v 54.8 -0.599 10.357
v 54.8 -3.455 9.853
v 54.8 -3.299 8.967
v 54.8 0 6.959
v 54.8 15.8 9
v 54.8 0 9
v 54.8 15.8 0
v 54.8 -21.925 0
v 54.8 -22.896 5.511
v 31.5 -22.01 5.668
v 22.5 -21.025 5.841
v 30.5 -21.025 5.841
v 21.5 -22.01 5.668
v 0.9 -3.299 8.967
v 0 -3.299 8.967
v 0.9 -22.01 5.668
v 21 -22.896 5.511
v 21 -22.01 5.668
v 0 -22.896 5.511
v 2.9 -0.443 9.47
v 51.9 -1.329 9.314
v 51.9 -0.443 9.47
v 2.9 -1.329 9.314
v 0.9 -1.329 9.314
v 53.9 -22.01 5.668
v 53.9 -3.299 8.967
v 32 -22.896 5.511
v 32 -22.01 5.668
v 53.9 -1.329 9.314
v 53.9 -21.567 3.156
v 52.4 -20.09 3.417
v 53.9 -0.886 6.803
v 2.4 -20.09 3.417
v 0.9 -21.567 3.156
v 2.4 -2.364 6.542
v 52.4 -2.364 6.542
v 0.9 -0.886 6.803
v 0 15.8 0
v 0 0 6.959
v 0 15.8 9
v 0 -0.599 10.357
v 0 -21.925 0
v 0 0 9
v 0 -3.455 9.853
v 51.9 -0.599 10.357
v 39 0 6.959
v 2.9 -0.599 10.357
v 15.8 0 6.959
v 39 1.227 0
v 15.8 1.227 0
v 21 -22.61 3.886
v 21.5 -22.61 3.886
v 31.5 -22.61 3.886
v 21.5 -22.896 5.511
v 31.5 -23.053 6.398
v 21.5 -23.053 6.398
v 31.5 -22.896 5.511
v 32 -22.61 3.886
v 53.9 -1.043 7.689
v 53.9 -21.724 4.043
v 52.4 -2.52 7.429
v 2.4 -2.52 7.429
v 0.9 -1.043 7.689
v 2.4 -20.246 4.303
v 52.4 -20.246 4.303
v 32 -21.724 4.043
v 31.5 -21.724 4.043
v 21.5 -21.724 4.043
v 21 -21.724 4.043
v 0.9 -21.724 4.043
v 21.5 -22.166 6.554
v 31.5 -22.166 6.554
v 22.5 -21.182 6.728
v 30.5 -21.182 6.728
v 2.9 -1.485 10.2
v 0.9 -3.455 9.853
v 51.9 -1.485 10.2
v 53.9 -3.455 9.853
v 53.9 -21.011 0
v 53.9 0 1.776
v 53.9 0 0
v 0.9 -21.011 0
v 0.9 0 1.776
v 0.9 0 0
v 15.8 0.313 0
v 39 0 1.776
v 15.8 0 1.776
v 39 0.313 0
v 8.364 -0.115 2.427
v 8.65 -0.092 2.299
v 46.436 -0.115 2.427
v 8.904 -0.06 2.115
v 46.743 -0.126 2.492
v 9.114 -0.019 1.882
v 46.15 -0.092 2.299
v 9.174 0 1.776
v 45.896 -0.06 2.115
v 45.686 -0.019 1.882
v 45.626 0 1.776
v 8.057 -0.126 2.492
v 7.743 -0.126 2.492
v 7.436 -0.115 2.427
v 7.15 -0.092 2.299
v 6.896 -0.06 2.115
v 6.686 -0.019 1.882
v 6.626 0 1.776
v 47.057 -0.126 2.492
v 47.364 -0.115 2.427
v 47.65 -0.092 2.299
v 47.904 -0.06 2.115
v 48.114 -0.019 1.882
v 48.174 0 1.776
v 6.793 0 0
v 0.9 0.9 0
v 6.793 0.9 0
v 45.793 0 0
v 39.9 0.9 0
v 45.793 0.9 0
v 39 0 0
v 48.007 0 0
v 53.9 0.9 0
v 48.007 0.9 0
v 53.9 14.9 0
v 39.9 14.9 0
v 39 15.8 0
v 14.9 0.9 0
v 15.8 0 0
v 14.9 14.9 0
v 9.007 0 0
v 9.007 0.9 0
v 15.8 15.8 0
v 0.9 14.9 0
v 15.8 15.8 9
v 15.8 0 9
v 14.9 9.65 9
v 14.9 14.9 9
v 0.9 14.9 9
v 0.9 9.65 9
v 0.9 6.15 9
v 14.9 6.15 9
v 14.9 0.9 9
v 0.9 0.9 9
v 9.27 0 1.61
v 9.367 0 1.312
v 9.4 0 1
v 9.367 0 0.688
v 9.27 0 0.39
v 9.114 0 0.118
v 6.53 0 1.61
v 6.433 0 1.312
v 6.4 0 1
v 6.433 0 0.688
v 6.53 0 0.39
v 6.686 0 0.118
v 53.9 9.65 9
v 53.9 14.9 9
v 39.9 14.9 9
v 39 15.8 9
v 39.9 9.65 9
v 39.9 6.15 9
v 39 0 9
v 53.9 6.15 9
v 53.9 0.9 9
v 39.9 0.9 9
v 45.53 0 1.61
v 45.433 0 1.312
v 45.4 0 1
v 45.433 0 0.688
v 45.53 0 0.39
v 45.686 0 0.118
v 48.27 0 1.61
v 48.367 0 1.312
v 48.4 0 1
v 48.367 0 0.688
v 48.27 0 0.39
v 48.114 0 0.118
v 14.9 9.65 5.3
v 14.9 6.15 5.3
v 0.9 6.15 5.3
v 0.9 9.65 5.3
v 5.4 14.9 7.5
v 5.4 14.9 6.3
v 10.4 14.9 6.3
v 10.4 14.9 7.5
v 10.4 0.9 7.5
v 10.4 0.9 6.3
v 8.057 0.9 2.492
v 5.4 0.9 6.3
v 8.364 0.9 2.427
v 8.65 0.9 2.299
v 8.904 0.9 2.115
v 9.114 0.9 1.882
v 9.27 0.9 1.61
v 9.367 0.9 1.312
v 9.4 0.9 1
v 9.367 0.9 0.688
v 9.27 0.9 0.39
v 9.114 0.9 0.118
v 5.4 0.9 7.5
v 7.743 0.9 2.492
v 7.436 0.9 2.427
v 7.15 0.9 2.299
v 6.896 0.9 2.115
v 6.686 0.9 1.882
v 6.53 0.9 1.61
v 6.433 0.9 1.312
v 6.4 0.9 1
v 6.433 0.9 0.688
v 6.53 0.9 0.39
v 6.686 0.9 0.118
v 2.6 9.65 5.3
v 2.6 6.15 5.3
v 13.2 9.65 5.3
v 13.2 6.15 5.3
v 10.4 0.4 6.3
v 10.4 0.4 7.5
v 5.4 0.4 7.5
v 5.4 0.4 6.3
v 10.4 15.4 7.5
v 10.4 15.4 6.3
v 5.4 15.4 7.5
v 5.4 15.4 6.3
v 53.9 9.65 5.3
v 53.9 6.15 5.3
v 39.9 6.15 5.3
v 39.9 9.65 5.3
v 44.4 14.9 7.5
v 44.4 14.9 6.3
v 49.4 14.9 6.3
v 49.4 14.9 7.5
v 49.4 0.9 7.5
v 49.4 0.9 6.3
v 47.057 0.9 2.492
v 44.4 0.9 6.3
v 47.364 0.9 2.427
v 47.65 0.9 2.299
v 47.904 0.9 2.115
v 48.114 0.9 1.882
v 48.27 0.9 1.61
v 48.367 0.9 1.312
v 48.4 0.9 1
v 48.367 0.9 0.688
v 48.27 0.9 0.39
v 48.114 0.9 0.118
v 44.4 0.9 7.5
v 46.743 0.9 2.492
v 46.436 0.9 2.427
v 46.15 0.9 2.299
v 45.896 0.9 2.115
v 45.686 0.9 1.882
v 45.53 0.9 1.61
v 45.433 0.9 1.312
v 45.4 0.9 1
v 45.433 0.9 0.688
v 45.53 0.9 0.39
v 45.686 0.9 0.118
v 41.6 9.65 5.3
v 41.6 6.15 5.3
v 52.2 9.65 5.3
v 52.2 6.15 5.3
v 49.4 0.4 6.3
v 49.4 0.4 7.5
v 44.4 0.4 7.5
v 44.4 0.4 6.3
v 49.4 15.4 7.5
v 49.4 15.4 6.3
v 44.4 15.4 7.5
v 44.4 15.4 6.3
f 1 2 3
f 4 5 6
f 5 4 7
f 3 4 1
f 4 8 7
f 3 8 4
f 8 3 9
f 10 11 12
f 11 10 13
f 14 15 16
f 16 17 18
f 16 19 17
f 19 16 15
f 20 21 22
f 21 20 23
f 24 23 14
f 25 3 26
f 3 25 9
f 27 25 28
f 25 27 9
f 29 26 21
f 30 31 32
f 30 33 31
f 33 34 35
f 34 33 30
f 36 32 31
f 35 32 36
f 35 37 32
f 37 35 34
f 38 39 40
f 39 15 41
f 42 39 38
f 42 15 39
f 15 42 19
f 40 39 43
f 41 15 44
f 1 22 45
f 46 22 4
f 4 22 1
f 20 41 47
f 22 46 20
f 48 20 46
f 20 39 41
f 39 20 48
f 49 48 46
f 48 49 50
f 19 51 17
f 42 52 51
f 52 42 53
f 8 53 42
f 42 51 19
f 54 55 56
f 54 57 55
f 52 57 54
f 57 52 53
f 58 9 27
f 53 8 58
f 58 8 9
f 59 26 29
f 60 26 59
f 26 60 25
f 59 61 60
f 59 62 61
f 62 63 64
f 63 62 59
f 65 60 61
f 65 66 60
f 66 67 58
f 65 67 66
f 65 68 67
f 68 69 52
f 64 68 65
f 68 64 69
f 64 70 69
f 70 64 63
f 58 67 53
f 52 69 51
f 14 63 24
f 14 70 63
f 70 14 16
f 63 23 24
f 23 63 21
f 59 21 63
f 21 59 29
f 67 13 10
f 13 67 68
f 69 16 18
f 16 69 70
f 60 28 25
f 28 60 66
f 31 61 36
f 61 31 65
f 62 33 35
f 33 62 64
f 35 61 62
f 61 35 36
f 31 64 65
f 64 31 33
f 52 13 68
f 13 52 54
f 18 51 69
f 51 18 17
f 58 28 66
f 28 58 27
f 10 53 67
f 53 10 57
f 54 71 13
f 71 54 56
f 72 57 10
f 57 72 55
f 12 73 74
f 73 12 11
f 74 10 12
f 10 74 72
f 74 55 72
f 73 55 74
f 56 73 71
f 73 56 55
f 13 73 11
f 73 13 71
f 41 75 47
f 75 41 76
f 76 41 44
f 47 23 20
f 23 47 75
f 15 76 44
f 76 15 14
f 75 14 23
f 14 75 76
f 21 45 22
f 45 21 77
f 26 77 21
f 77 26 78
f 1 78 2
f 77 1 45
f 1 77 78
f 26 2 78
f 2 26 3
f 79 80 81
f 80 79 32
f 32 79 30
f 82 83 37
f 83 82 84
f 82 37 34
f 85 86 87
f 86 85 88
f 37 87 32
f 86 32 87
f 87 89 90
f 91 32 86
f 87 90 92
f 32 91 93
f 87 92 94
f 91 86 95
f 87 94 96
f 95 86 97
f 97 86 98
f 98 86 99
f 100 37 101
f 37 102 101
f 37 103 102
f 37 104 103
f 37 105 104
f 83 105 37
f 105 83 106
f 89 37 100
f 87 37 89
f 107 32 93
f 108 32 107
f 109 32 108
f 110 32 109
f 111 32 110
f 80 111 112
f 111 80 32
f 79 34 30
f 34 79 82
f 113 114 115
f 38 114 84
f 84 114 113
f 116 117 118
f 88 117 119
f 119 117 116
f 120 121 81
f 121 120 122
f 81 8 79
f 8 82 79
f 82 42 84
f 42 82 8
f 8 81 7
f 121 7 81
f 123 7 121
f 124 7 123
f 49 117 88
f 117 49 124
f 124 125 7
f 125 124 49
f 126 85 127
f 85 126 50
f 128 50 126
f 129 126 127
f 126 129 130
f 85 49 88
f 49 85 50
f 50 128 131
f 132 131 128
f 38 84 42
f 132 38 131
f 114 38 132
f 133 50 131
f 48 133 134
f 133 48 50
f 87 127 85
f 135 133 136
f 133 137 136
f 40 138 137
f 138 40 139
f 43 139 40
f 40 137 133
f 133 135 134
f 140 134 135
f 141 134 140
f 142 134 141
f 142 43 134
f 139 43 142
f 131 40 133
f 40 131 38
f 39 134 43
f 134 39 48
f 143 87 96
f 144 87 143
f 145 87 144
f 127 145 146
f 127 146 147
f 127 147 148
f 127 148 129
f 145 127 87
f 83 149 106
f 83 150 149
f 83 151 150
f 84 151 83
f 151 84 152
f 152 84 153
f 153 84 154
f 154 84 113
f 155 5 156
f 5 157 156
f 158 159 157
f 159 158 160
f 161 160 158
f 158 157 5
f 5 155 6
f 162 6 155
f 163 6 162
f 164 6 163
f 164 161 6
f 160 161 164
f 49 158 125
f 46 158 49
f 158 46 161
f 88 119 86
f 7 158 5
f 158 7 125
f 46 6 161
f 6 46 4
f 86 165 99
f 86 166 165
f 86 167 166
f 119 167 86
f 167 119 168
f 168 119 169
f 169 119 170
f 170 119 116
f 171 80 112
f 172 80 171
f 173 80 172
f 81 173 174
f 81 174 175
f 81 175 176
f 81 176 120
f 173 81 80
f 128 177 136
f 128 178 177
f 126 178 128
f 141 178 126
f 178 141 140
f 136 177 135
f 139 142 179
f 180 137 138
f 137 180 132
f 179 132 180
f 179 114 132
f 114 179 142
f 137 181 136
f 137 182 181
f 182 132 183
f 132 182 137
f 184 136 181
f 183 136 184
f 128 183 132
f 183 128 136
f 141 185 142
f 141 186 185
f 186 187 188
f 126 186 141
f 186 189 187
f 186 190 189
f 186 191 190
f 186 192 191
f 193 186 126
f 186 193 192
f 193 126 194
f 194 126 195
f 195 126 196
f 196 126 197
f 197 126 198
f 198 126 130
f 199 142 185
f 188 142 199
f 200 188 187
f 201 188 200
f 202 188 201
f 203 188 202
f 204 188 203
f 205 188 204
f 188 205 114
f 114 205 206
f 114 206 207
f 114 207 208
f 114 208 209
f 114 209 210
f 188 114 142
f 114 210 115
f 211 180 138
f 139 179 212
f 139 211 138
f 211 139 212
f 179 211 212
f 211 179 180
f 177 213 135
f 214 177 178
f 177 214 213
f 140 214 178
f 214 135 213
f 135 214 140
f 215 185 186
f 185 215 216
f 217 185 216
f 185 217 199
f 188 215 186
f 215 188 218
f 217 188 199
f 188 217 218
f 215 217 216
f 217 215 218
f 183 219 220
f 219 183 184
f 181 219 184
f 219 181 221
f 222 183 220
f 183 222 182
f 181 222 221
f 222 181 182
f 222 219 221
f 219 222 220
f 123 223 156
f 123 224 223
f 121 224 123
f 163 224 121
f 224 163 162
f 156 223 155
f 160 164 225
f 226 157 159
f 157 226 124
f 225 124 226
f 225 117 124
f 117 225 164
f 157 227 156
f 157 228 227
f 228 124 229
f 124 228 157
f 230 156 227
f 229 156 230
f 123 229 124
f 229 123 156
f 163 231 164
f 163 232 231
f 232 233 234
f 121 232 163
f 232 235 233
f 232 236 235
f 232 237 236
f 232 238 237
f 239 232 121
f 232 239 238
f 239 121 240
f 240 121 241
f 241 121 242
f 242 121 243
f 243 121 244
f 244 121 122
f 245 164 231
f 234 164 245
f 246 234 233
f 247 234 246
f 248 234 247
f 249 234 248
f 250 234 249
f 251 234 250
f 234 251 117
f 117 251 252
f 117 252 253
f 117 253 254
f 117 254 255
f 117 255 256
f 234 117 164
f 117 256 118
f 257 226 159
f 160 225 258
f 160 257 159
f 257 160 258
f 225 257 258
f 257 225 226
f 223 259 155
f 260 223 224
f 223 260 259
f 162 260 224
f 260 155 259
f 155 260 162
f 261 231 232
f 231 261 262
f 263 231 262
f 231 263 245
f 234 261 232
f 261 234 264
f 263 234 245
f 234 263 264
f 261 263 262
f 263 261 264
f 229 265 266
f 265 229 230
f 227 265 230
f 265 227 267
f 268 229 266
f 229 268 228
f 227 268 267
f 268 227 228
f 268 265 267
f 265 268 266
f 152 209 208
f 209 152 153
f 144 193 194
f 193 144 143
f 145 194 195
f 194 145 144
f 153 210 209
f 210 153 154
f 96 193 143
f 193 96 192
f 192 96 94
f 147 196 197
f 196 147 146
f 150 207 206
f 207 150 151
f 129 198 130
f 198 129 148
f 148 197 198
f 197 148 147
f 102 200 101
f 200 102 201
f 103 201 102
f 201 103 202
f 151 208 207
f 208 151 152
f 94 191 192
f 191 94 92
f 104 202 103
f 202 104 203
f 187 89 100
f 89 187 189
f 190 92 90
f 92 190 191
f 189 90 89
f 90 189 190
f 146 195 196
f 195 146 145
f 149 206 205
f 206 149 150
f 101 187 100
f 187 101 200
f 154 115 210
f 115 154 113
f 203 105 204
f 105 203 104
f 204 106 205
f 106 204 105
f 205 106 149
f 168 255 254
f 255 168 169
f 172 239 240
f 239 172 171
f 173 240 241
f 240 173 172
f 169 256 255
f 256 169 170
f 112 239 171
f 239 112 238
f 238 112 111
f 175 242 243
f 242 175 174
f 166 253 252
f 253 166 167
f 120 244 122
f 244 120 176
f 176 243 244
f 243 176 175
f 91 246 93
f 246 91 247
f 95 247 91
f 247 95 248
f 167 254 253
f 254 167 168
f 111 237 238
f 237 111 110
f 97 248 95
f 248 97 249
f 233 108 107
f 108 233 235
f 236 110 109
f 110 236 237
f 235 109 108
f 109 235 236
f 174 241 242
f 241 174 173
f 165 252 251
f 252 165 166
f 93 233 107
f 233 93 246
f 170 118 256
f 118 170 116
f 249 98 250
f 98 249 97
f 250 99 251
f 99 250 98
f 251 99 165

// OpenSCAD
plate_thickness=1.5; // From official Cherry MX spec
switch_width=14;
height=9;
switch_extra_space=[5, 0.5, 1.2];

thickness=0.9;
gap=25; // 5;

bluepill=[53, 21, 1.65];

c=bluepill[1]+thickness*2;

bluepill_z_offset=3;
bluepill_y_offset=cos(10)*(bluepill[1]+thickness*2);

main();
//bottom();

module bottom() {
    difference() {
        translate([0, -bluepill_y_offset, 0])
            cube([thickness*2+gap+switch_width*2,  thickness*2 +switch_width + bluepill_y_offset, thickness]);
        translate([thickness*2+switch_width, thickness, 0])
            cube([gap-thickness*2, switch_width+thickness, thickness]);
    }

    translate([0, 0, thickness]) {
        translate([thickness, thickness]) xxcube([switch_width, switch_width, 2]);
        translate([thickness+switch_width+gap, thickness]) xxcube([switch_width, switch_width, 2]);
        translate([thickness, -bluepill_y_offset+thickness, 0]) xxcube([bluepill[0], bluepill[1], 2]);
    }
}

module xxcube(s) difference() {
    cube(s);
    translate([thickness, thickness]) cube(s-[thickness*2, thickness*2, 0]);
    translate([thickness*2*2, 0]) cube(s-[thickness*4*2, 0, 0]);
    translate([0, thickness*2*2]) cube(s-[0, thickness*4*2, 0]);
}

module main() difference() {
    union() {
        intersection() {
            translate([0, -bluepill_y_offset, bluepill_z_offset]) rotate([10, 0, 0]) {
                bluepill_case();
                translate([0, 0, -10]) difference() {
                    cube(bluepill+[thickness*2, thickness*2, -bluepill[2]+10]);
                    translate([thickness, thickness]) cube(bluepill+[0, 0, -bluepill[2]+10]);
                }
            }
            translate([0, -99, 0]) cube(999);
        }

        cube([thickness*2+switch_width, thickness*2+switch_width, height]);
        translate([bluepill[0]-switch_width, 0]) cube([thickness*2+switch_width, thickness*2+switch_width, height]);
    }
    
    
    translate([thickness, thickness, 0]) switch_void();
    translate([bluepill[0]-switch_width+thickness, thickness, 0]) switch_void();
    
    
    // wire hole
    translate([thickness+switch_width/2, 0, 1]) rotate([90, 0])
        cylinder(h=thickness*2+0.00001, d=3, center=true, $fn=30);
    translate([thickness+switch_width*1.5+gap, 0, 1]) rotate([90, 0])
        cylinder(h=thickness*2+0.00001, d=3, center=true, $fn=30);
}


module bluepill_case() {
    x=2;
    space=0.5;
    difference() {
        cube(bluepill+[thickness*2, thickness*2, thickness]);
        translate([thickness, thickness, thickness]) cube(bluepill);
        translate([thickness+1.5, thickness+1.5, 0])
            cube([bluepill[0]-1.5*2, bluepill[1]-1.5*2, thickness]);
        translate([bluepill[0]/2-10/2-space, 0, thickness]) cube([space, thickness, bluepill[2]]);
        translate([bluepill[0]/2+10/2, 0, thickness]) cube([space, thickness, bluepill[2]]);
    }
    translate([bluepill[0]/2-10/2, 0, thickness+bluepill[2]])
        hull() {
            cube([10, thickness, thickness]);
            translate([1, 0, 0]) cube([8, thickness+1, thickness]);
        }
    translate([0, thickness+bluepill[1]-x, thickness+bluepill[2]])
       hull() {
           cube([thickness, thickness+x, thickness]);
           translate([0, x, 0]) cube([x+thickness, thickness, thickness]);
       }
    translate([bluepill[0]+thickness-x, thickness+bluepill[1]-x, thickness+bluepill[2]])
       hull() {
           translate([x, 0, 0]) cube([thickness, thickness+x, thickness]);
           translate([0, x, 0]) cube([x+thickness, thickness, thickness]);
       }
}

module switch_void() {
        clip_spec=[1.7, 3.5, 3.7];
        clip=[[0, height],
              [clip_spec[0], height-clip_spec[2]],
              [0, height-clip_spec[2]]];
        difference() {
            cube([switch_width, switch_width, height]);
            translate([0, (switch_width+clip_spec[1])/2]) rotate([90, 0]) linear_extrude(height=clip_spec[1])
                polygon(clip);
            translate([switch_width, (switch_width+clip_spec[1])/2]) mirror([1, 0]) rotate([90, 0]) linear_extrude(height=clip_spec[1])
                polygon(clip);
        }
        translate([(switch_width-switch_extra_space[0])/2, -switch_extra_space[1], height-plate_thickness-switch_extra_space[2]])
            cube(switch_extra_space);
        translate([(switch_width-switch_extra_space[0])/2, switch_width, height-plate_thickness-switch_extra_space[2]])
            cube(switch_extra_space);
}
